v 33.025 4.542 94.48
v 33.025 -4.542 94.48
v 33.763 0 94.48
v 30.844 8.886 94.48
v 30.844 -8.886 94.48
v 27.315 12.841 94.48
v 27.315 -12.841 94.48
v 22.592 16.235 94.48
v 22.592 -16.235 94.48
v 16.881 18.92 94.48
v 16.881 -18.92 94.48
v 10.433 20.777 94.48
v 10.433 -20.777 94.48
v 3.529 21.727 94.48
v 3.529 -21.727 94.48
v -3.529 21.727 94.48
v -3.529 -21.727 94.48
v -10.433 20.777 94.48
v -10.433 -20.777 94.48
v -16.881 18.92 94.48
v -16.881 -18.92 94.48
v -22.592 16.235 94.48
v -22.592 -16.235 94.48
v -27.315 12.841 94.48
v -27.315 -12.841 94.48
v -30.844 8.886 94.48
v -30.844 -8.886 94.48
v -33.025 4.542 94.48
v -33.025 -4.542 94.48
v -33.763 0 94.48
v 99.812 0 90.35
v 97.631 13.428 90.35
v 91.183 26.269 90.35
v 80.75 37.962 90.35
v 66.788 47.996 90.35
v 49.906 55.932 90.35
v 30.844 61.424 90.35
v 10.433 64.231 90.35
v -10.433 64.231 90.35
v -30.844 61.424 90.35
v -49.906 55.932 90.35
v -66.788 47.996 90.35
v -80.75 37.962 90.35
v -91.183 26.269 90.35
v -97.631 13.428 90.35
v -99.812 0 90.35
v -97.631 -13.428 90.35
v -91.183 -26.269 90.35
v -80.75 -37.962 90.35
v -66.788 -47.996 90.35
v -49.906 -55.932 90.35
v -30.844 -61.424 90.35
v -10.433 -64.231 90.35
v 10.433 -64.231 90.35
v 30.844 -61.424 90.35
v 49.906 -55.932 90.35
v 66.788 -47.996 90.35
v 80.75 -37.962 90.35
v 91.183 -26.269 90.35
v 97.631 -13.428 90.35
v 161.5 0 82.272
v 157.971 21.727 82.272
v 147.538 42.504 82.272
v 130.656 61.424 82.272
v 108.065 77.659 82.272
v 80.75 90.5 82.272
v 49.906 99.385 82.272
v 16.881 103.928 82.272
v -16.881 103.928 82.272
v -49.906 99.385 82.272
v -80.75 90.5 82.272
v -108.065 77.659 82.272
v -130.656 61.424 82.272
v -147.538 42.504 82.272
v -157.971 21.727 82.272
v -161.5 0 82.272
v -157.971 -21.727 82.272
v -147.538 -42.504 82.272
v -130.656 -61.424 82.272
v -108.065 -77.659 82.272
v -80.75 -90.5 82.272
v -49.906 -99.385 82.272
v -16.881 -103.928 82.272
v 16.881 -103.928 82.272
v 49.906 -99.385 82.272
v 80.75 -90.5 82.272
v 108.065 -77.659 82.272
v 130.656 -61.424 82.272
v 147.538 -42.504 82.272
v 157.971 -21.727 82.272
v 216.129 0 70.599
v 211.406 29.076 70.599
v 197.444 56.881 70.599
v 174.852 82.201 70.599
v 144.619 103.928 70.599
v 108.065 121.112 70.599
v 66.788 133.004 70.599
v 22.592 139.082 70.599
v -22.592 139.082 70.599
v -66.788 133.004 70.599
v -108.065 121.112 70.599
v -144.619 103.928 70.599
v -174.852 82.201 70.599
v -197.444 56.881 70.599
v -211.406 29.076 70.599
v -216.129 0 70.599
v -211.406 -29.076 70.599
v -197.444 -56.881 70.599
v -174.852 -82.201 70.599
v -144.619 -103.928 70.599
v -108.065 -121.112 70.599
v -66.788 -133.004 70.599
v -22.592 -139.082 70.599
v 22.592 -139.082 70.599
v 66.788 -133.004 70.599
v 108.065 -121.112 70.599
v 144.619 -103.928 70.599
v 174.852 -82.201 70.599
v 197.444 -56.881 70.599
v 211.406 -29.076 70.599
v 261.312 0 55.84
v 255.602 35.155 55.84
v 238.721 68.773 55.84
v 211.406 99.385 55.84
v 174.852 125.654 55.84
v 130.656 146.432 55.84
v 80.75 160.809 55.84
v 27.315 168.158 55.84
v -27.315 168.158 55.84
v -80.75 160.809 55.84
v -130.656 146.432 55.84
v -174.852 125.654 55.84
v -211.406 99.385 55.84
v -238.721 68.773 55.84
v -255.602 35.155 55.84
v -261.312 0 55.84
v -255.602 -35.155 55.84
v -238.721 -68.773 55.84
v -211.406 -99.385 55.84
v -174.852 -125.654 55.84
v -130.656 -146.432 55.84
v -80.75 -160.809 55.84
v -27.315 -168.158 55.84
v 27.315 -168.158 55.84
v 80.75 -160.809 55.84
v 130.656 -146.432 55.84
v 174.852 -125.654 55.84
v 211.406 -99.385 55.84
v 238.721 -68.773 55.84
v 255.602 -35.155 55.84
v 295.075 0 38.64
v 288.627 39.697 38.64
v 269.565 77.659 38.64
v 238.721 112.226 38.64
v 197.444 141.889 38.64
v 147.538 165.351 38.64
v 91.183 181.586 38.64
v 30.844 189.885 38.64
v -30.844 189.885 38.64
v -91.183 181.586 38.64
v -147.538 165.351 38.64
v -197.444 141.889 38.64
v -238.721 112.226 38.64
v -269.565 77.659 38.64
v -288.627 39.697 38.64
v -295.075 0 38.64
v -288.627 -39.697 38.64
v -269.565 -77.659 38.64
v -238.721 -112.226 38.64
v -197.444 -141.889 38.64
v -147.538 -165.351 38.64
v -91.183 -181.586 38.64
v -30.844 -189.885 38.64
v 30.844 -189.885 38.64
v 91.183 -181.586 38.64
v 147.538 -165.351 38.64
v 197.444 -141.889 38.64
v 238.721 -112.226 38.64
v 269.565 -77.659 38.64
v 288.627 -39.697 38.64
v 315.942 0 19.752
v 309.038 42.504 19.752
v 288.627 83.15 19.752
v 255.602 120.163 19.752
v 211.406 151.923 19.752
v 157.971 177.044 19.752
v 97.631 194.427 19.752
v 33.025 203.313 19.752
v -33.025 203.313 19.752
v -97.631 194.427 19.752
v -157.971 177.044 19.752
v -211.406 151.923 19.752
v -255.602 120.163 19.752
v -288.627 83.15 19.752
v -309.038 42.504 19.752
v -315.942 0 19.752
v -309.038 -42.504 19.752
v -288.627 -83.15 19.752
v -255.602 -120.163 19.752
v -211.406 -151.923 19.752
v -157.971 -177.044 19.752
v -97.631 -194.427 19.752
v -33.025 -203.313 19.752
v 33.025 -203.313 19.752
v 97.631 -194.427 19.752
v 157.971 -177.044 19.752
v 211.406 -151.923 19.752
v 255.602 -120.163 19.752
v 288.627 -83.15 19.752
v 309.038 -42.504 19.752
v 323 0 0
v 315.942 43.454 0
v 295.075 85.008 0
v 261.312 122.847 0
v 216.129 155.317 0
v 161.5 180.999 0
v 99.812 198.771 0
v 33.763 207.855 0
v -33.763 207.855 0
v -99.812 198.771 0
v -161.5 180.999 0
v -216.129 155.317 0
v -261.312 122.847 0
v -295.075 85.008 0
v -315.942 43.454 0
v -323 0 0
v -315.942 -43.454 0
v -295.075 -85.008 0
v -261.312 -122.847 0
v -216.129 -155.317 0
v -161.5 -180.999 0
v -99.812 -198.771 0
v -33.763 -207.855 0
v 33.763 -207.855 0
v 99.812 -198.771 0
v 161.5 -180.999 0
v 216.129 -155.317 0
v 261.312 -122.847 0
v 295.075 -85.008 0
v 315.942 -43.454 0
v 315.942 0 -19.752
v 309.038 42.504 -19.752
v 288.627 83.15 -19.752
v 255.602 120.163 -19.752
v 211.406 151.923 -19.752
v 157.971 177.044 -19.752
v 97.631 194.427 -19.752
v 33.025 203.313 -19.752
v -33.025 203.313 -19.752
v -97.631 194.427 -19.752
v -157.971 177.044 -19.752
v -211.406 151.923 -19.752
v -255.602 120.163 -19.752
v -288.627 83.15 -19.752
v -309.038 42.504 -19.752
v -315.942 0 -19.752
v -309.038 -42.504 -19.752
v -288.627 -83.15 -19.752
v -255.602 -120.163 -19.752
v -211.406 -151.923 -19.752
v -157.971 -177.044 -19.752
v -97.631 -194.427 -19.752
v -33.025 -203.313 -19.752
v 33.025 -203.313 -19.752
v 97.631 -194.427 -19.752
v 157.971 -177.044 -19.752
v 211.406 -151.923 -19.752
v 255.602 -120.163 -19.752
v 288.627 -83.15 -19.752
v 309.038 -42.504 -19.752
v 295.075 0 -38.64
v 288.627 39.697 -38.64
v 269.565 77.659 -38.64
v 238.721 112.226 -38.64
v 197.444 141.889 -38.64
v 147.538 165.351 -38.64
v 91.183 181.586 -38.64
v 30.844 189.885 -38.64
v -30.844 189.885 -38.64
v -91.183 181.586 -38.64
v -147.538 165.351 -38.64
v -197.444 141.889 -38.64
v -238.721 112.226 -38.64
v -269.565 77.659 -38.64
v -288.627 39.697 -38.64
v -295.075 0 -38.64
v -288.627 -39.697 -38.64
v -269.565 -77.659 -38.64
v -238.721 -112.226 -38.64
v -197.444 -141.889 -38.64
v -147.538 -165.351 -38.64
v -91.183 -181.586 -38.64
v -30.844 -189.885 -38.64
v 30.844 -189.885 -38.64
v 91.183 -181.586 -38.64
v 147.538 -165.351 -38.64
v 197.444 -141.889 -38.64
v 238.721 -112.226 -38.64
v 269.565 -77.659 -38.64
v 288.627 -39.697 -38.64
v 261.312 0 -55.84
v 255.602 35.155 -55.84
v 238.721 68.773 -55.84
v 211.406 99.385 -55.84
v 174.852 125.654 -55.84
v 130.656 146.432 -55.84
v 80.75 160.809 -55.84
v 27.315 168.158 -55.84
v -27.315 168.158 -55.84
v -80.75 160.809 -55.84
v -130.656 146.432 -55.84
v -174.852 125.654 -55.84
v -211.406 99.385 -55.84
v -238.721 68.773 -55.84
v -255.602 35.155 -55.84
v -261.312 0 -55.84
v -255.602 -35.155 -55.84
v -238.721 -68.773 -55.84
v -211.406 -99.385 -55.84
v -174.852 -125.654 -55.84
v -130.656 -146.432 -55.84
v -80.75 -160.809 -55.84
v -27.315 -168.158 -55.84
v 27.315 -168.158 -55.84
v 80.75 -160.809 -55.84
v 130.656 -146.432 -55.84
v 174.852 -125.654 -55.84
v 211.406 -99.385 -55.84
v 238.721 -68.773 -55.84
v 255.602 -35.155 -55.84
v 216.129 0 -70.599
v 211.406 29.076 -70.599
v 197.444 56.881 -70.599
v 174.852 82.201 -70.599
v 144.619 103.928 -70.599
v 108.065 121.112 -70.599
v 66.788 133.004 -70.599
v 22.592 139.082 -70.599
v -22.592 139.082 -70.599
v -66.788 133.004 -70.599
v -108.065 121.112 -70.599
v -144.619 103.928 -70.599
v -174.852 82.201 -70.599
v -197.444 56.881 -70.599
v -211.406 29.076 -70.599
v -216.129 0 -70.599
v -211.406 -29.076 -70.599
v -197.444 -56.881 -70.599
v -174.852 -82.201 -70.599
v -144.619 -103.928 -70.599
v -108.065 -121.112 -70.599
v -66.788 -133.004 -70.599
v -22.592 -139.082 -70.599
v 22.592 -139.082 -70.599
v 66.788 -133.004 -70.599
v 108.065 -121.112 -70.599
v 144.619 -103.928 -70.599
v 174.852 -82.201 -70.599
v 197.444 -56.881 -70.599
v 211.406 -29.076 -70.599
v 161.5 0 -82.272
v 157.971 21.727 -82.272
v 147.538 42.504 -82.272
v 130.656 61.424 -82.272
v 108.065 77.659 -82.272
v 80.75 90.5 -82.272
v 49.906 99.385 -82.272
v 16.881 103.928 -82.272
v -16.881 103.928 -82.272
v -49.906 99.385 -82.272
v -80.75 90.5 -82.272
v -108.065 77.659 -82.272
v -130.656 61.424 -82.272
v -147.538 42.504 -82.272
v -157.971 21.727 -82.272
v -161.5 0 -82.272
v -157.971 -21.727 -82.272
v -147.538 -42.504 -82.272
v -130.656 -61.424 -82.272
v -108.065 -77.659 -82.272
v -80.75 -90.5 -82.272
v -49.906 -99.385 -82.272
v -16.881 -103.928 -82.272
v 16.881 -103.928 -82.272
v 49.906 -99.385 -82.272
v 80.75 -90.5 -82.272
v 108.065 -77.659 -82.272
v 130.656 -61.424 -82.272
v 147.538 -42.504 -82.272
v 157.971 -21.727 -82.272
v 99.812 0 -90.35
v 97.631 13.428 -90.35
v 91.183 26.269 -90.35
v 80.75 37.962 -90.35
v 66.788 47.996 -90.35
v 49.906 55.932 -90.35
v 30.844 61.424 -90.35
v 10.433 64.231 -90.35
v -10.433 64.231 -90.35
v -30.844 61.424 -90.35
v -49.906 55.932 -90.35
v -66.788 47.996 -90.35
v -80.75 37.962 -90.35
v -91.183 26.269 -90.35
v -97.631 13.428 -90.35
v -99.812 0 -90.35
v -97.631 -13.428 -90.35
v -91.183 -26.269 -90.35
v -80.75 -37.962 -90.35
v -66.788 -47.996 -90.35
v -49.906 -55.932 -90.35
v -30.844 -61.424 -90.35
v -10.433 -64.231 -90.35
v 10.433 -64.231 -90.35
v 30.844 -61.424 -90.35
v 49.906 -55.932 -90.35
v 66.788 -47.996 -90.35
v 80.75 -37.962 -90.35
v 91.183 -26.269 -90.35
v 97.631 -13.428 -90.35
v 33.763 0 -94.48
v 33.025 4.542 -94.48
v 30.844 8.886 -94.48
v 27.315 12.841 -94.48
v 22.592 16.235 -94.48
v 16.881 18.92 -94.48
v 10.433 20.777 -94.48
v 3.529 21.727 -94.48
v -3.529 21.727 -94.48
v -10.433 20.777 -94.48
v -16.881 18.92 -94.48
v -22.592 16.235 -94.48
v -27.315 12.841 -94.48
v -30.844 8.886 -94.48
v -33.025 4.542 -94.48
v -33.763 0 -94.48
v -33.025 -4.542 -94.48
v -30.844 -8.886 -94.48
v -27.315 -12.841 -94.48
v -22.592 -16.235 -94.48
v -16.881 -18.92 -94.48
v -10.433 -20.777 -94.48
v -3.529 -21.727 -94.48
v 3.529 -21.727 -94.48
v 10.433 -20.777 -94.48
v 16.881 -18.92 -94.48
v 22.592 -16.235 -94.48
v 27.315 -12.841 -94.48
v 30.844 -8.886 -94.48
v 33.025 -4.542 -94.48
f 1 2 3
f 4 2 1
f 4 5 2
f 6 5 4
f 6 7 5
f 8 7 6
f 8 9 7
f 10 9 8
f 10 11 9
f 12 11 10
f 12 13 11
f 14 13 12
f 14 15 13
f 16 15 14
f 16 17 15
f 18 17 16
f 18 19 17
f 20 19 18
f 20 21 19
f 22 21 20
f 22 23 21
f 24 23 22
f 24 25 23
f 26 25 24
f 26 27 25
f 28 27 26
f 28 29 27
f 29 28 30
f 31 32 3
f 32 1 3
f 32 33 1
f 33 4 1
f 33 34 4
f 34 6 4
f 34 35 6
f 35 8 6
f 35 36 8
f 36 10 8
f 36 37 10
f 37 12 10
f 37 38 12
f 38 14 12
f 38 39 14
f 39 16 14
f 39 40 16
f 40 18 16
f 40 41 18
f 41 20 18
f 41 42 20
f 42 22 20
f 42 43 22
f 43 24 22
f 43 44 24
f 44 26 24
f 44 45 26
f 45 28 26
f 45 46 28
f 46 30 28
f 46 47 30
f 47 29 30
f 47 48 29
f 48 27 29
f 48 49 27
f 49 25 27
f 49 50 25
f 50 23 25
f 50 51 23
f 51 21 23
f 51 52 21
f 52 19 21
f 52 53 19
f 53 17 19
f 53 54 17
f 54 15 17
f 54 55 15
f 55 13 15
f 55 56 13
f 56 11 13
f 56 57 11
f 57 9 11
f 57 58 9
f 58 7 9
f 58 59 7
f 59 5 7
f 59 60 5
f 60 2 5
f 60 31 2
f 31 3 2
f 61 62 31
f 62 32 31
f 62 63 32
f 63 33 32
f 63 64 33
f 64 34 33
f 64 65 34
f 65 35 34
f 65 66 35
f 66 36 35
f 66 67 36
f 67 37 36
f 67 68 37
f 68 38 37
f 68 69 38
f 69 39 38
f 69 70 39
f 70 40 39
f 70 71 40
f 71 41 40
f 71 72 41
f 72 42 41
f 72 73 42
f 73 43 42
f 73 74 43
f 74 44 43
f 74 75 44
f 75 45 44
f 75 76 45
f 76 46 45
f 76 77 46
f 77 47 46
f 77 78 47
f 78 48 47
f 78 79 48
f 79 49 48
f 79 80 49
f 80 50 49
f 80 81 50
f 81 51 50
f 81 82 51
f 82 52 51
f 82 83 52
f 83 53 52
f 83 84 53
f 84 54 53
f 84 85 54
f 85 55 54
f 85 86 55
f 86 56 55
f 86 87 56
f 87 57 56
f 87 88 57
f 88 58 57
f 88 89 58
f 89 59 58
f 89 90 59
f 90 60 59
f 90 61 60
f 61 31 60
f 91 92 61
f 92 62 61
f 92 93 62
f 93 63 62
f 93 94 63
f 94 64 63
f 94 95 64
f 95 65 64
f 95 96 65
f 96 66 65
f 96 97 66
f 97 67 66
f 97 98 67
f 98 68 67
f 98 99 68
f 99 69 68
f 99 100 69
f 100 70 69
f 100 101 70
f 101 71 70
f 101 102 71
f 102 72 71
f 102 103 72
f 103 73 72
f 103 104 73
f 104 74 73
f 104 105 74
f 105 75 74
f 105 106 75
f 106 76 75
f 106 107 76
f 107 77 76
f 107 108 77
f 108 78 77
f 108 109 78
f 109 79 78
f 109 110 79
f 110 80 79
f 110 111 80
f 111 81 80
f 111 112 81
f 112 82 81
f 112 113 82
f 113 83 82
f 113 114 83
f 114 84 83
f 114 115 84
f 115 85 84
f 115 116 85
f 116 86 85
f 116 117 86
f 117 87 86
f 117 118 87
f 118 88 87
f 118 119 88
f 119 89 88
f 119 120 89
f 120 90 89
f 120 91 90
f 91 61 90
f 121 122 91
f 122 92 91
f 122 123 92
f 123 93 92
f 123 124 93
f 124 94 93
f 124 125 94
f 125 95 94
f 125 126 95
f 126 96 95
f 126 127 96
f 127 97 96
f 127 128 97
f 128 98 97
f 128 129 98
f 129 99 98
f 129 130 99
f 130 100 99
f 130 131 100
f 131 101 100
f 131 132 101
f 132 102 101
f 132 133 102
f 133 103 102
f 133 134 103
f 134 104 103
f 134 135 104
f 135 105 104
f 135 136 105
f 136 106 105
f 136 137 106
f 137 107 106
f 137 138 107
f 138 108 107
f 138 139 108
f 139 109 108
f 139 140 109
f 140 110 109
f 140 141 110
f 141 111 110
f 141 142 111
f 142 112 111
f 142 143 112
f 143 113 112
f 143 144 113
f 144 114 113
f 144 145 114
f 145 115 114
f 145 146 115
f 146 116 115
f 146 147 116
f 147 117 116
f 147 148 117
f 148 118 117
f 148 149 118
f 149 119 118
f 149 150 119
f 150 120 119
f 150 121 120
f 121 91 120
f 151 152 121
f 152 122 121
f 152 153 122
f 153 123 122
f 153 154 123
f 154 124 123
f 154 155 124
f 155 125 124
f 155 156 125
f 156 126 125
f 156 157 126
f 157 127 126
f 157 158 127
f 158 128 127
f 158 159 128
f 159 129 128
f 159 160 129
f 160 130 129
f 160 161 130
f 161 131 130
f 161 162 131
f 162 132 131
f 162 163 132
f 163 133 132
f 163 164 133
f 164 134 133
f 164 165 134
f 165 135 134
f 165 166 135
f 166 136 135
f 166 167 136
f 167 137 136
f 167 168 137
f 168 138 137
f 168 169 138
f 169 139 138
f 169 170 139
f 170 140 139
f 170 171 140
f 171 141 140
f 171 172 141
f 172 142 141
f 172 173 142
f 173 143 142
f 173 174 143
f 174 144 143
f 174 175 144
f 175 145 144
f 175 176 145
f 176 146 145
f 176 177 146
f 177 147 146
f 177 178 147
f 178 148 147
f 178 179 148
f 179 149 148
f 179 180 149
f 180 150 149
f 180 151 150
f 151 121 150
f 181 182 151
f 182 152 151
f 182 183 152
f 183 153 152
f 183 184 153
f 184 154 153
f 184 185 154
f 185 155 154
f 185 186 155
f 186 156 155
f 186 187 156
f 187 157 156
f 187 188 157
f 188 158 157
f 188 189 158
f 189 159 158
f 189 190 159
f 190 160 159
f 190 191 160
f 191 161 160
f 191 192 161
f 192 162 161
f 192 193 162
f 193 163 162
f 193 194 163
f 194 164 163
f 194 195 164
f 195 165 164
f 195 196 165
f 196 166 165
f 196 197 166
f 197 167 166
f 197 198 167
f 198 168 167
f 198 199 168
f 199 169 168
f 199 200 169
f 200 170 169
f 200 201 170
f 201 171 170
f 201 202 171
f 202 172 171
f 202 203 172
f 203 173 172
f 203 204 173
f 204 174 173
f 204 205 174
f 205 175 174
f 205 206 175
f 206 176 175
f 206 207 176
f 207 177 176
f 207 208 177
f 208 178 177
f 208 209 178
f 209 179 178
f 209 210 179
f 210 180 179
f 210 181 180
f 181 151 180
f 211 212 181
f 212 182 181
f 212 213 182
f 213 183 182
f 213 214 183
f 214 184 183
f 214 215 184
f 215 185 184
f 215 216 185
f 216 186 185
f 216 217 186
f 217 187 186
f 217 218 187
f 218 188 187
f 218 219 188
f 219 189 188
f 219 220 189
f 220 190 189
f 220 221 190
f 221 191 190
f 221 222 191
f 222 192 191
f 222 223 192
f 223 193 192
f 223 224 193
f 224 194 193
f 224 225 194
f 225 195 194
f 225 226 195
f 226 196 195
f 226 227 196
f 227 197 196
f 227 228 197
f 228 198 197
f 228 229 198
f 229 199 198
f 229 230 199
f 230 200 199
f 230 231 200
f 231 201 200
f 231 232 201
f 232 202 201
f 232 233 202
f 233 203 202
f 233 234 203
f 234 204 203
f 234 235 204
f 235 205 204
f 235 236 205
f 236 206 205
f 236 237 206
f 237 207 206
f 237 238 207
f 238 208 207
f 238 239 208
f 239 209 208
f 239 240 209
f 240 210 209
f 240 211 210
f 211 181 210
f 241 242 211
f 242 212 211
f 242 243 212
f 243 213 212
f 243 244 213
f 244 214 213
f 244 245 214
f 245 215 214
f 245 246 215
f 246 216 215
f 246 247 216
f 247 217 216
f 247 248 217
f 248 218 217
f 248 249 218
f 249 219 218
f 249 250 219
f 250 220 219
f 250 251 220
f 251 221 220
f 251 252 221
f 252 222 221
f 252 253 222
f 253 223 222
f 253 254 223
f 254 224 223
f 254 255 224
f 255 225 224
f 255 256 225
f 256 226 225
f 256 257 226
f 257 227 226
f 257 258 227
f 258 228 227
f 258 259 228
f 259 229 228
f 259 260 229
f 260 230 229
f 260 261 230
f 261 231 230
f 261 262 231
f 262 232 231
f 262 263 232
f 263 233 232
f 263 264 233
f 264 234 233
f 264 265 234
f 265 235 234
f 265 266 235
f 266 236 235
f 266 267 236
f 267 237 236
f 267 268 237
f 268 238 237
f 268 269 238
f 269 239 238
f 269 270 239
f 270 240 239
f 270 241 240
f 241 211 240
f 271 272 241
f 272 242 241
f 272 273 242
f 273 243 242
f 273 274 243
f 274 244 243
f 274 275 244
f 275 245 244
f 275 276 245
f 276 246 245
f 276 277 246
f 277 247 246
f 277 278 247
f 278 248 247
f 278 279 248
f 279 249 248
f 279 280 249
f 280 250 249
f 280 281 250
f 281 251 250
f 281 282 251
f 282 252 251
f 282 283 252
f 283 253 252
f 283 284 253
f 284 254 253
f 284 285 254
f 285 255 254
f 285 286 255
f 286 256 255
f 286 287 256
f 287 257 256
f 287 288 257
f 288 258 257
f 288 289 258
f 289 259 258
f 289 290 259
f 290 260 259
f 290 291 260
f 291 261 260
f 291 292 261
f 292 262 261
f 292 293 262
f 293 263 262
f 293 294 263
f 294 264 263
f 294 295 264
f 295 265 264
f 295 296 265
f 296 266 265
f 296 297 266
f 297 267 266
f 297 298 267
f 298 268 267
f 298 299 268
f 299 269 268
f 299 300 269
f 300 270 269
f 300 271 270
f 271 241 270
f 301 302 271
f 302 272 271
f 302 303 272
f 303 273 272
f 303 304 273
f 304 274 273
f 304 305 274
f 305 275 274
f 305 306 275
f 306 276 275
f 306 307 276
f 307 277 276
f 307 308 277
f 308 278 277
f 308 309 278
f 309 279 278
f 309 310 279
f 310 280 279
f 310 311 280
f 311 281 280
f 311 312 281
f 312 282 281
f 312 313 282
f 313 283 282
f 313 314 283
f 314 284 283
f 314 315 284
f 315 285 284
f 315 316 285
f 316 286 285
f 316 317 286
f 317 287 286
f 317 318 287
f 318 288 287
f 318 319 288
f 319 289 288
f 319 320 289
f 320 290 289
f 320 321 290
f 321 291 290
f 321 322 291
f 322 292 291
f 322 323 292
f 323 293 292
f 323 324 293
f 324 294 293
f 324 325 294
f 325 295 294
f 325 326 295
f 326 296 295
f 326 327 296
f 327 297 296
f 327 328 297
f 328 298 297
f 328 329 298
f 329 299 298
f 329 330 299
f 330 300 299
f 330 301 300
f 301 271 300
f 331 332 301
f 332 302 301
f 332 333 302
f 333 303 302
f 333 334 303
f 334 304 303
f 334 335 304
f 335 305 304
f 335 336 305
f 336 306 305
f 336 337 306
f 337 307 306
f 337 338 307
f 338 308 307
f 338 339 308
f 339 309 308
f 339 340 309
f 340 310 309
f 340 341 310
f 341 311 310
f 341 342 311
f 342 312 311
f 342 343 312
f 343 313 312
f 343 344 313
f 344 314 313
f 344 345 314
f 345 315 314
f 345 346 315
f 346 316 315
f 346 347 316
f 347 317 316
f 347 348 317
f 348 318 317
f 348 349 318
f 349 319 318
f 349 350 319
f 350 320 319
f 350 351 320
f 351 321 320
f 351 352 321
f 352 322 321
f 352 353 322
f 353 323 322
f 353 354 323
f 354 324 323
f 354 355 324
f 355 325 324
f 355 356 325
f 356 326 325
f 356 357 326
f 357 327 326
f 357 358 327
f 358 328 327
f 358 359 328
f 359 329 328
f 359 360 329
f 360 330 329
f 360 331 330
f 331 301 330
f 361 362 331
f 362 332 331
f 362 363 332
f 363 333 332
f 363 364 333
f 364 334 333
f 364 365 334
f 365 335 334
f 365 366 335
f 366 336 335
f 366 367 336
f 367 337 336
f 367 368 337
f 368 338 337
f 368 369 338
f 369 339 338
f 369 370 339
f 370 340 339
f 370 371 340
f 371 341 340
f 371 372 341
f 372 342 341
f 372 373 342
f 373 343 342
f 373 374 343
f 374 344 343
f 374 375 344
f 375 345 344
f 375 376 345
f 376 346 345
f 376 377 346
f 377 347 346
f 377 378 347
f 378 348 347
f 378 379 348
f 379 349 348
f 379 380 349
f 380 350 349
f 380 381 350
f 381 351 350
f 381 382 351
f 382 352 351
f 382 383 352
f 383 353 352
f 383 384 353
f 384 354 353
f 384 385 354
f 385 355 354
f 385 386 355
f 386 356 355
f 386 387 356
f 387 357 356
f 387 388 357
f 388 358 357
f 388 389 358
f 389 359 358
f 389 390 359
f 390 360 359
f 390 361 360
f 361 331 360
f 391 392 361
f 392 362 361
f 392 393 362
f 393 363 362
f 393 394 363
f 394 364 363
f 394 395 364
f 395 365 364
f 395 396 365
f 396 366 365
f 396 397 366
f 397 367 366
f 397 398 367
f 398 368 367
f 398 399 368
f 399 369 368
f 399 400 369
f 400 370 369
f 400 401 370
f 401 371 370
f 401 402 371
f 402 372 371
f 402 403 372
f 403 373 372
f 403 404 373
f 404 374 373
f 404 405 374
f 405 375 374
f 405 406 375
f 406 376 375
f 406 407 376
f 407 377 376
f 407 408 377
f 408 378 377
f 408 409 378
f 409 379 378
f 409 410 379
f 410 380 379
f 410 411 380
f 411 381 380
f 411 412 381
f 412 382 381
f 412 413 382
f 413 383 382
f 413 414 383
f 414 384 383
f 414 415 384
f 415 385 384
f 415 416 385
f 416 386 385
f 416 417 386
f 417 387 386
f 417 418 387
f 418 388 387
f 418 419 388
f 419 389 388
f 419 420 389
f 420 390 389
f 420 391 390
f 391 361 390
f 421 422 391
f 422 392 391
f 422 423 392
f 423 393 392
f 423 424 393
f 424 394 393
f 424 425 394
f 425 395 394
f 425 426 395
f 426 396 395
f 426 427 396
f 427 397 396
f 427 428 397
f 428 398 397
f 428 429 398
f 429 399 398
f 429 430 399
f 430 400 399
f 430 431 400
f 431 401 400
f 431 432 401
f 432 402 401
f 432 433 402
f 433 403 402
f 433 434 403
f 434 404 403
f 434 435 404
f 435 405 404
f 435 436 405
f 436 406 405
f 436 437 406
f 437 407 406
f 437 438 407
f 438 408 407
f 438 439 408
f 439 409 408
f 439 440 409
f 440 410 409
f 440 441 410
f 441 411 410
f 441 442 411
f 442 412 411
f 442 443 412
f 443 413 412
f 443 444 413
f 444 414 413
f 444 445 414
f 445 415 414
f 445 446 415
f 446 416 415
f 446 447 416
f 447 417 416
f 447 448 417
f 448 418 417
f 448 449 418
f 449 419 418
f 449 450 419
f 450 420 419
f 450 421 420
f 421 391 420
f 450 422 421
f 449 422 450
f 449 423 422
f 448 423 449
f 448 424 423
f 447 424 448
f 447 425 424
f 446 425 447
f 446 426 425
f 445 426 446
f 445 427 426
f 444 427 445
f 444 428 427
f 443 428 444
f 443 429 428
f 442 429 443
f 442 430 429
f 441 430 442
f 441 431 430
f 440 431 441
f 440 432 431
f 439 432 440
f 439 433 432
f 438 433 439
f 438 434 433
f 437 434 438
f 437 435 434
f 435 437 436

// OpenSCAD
// Generated by SolidPython 1.0.1 on 2020-07-29 00:46:53


scale(v = [17, 11, 5]) {
	sphere(r = 19);
}
/***********************************************
*********      SolidPython code:      **********
************************************************
 
# import packages: SolidPython
from solid import *
from solid.utils import *
from itertools import chain, combinations, permutations


class Resize:

    def __init__(self, scad_file):
        self.scad_file = scad_file
        #self.scad_file = import_scad(scad_file)
        # cone/cylinder param:
        self.r1 = 0
        self.r2 = 0
        self.h = 0
        # rectangular prism param:
        self.w = 0
        self.l = 0
        # ellipse param:
        self.r = 0

    # import OpenScad code (file name corresponds to shape)


    # classify shape + parameters
    def assign(self, param1, param2, param3):
        if self.scad_file == 'cone.scad':
            self.r1 = param1
            self.r2 = param2
            self.h = param3
        elif self.scad_file == 'cylinder.scad':
            self.r1 = param1
            self.r2 = param2
            self.h = param3
        elif self.scad_file == 'rectangularPrism.scad':
            self.h = param1
            self.l = param2
            self.w = param3
        else:
            self.r = param1
            self.h = param2

    # resize parameters
    def iterate(self):
        x = range(3, 20, 2)
        i = 1
        if self.scad_file == 'cone.scad':
            tempList = list(permutations(x, 2))
            for temp in tempList:
                param1 = temp[0]
                param2 = temp[1]
                filepath = 'produced_scad_files/' + 'cone' + str(param1) + '_' + str(param2) + '_' + '.scad'
                scad_render_to_file(cylinder(h=param1, r1=param2, r2=0), filepath)

        elif self.scad_file == 'cylinder.scad':
            tempList = list(permutations(x, 3))
            for temp in tempList:
                param1 = temp[0]
                param2 = temp[1]
                filepath = 'produced_scad_files/' + 'cylinder' + str(param1) + '_' + str(param2) + '_' + '.scad'
                scad_render_to_file(cylinder(h=param1, r1=param2, r2=param2), filepath)

        elif self.scad_file == 'rectangularPrism.scad':
            tempList = list(permutations(x, 3))
            for temp in tempList:
                param1 = temp[0]
                param2 = temp[1]
                param3 = temp[2]
                filepath = 'produced_scad_files/' + 'rectangularPrism' + str(param1) + '_' + str(param2) + '_' + str(
                    param3) + '.scad'
                scad_render_to_file(cube(size=(param1, param2, param3)), filepath)

        elif self.scad_file == 'ellipse.scad':
            tempList = list(permutations(x, 4))
            for temp in tempList:
                param1 = temp[0]
                param2 = temp[1]
                param3 = temp[2]
                param4 = temp[3]
                filepath = 'produced_scad_files/' + 'ellipse' + str(param1) + '_' + str(param2) + '_' + str(param3) + '_' + str(param4) + '.scad'
                scad_render_to_file(scale([param1, param2, param3])(sphere(r=param4)), filepath)

    def render_to_scadfile(self):
        scad_render_to_file(scad, 'example.scad') 
 
************************************************/
